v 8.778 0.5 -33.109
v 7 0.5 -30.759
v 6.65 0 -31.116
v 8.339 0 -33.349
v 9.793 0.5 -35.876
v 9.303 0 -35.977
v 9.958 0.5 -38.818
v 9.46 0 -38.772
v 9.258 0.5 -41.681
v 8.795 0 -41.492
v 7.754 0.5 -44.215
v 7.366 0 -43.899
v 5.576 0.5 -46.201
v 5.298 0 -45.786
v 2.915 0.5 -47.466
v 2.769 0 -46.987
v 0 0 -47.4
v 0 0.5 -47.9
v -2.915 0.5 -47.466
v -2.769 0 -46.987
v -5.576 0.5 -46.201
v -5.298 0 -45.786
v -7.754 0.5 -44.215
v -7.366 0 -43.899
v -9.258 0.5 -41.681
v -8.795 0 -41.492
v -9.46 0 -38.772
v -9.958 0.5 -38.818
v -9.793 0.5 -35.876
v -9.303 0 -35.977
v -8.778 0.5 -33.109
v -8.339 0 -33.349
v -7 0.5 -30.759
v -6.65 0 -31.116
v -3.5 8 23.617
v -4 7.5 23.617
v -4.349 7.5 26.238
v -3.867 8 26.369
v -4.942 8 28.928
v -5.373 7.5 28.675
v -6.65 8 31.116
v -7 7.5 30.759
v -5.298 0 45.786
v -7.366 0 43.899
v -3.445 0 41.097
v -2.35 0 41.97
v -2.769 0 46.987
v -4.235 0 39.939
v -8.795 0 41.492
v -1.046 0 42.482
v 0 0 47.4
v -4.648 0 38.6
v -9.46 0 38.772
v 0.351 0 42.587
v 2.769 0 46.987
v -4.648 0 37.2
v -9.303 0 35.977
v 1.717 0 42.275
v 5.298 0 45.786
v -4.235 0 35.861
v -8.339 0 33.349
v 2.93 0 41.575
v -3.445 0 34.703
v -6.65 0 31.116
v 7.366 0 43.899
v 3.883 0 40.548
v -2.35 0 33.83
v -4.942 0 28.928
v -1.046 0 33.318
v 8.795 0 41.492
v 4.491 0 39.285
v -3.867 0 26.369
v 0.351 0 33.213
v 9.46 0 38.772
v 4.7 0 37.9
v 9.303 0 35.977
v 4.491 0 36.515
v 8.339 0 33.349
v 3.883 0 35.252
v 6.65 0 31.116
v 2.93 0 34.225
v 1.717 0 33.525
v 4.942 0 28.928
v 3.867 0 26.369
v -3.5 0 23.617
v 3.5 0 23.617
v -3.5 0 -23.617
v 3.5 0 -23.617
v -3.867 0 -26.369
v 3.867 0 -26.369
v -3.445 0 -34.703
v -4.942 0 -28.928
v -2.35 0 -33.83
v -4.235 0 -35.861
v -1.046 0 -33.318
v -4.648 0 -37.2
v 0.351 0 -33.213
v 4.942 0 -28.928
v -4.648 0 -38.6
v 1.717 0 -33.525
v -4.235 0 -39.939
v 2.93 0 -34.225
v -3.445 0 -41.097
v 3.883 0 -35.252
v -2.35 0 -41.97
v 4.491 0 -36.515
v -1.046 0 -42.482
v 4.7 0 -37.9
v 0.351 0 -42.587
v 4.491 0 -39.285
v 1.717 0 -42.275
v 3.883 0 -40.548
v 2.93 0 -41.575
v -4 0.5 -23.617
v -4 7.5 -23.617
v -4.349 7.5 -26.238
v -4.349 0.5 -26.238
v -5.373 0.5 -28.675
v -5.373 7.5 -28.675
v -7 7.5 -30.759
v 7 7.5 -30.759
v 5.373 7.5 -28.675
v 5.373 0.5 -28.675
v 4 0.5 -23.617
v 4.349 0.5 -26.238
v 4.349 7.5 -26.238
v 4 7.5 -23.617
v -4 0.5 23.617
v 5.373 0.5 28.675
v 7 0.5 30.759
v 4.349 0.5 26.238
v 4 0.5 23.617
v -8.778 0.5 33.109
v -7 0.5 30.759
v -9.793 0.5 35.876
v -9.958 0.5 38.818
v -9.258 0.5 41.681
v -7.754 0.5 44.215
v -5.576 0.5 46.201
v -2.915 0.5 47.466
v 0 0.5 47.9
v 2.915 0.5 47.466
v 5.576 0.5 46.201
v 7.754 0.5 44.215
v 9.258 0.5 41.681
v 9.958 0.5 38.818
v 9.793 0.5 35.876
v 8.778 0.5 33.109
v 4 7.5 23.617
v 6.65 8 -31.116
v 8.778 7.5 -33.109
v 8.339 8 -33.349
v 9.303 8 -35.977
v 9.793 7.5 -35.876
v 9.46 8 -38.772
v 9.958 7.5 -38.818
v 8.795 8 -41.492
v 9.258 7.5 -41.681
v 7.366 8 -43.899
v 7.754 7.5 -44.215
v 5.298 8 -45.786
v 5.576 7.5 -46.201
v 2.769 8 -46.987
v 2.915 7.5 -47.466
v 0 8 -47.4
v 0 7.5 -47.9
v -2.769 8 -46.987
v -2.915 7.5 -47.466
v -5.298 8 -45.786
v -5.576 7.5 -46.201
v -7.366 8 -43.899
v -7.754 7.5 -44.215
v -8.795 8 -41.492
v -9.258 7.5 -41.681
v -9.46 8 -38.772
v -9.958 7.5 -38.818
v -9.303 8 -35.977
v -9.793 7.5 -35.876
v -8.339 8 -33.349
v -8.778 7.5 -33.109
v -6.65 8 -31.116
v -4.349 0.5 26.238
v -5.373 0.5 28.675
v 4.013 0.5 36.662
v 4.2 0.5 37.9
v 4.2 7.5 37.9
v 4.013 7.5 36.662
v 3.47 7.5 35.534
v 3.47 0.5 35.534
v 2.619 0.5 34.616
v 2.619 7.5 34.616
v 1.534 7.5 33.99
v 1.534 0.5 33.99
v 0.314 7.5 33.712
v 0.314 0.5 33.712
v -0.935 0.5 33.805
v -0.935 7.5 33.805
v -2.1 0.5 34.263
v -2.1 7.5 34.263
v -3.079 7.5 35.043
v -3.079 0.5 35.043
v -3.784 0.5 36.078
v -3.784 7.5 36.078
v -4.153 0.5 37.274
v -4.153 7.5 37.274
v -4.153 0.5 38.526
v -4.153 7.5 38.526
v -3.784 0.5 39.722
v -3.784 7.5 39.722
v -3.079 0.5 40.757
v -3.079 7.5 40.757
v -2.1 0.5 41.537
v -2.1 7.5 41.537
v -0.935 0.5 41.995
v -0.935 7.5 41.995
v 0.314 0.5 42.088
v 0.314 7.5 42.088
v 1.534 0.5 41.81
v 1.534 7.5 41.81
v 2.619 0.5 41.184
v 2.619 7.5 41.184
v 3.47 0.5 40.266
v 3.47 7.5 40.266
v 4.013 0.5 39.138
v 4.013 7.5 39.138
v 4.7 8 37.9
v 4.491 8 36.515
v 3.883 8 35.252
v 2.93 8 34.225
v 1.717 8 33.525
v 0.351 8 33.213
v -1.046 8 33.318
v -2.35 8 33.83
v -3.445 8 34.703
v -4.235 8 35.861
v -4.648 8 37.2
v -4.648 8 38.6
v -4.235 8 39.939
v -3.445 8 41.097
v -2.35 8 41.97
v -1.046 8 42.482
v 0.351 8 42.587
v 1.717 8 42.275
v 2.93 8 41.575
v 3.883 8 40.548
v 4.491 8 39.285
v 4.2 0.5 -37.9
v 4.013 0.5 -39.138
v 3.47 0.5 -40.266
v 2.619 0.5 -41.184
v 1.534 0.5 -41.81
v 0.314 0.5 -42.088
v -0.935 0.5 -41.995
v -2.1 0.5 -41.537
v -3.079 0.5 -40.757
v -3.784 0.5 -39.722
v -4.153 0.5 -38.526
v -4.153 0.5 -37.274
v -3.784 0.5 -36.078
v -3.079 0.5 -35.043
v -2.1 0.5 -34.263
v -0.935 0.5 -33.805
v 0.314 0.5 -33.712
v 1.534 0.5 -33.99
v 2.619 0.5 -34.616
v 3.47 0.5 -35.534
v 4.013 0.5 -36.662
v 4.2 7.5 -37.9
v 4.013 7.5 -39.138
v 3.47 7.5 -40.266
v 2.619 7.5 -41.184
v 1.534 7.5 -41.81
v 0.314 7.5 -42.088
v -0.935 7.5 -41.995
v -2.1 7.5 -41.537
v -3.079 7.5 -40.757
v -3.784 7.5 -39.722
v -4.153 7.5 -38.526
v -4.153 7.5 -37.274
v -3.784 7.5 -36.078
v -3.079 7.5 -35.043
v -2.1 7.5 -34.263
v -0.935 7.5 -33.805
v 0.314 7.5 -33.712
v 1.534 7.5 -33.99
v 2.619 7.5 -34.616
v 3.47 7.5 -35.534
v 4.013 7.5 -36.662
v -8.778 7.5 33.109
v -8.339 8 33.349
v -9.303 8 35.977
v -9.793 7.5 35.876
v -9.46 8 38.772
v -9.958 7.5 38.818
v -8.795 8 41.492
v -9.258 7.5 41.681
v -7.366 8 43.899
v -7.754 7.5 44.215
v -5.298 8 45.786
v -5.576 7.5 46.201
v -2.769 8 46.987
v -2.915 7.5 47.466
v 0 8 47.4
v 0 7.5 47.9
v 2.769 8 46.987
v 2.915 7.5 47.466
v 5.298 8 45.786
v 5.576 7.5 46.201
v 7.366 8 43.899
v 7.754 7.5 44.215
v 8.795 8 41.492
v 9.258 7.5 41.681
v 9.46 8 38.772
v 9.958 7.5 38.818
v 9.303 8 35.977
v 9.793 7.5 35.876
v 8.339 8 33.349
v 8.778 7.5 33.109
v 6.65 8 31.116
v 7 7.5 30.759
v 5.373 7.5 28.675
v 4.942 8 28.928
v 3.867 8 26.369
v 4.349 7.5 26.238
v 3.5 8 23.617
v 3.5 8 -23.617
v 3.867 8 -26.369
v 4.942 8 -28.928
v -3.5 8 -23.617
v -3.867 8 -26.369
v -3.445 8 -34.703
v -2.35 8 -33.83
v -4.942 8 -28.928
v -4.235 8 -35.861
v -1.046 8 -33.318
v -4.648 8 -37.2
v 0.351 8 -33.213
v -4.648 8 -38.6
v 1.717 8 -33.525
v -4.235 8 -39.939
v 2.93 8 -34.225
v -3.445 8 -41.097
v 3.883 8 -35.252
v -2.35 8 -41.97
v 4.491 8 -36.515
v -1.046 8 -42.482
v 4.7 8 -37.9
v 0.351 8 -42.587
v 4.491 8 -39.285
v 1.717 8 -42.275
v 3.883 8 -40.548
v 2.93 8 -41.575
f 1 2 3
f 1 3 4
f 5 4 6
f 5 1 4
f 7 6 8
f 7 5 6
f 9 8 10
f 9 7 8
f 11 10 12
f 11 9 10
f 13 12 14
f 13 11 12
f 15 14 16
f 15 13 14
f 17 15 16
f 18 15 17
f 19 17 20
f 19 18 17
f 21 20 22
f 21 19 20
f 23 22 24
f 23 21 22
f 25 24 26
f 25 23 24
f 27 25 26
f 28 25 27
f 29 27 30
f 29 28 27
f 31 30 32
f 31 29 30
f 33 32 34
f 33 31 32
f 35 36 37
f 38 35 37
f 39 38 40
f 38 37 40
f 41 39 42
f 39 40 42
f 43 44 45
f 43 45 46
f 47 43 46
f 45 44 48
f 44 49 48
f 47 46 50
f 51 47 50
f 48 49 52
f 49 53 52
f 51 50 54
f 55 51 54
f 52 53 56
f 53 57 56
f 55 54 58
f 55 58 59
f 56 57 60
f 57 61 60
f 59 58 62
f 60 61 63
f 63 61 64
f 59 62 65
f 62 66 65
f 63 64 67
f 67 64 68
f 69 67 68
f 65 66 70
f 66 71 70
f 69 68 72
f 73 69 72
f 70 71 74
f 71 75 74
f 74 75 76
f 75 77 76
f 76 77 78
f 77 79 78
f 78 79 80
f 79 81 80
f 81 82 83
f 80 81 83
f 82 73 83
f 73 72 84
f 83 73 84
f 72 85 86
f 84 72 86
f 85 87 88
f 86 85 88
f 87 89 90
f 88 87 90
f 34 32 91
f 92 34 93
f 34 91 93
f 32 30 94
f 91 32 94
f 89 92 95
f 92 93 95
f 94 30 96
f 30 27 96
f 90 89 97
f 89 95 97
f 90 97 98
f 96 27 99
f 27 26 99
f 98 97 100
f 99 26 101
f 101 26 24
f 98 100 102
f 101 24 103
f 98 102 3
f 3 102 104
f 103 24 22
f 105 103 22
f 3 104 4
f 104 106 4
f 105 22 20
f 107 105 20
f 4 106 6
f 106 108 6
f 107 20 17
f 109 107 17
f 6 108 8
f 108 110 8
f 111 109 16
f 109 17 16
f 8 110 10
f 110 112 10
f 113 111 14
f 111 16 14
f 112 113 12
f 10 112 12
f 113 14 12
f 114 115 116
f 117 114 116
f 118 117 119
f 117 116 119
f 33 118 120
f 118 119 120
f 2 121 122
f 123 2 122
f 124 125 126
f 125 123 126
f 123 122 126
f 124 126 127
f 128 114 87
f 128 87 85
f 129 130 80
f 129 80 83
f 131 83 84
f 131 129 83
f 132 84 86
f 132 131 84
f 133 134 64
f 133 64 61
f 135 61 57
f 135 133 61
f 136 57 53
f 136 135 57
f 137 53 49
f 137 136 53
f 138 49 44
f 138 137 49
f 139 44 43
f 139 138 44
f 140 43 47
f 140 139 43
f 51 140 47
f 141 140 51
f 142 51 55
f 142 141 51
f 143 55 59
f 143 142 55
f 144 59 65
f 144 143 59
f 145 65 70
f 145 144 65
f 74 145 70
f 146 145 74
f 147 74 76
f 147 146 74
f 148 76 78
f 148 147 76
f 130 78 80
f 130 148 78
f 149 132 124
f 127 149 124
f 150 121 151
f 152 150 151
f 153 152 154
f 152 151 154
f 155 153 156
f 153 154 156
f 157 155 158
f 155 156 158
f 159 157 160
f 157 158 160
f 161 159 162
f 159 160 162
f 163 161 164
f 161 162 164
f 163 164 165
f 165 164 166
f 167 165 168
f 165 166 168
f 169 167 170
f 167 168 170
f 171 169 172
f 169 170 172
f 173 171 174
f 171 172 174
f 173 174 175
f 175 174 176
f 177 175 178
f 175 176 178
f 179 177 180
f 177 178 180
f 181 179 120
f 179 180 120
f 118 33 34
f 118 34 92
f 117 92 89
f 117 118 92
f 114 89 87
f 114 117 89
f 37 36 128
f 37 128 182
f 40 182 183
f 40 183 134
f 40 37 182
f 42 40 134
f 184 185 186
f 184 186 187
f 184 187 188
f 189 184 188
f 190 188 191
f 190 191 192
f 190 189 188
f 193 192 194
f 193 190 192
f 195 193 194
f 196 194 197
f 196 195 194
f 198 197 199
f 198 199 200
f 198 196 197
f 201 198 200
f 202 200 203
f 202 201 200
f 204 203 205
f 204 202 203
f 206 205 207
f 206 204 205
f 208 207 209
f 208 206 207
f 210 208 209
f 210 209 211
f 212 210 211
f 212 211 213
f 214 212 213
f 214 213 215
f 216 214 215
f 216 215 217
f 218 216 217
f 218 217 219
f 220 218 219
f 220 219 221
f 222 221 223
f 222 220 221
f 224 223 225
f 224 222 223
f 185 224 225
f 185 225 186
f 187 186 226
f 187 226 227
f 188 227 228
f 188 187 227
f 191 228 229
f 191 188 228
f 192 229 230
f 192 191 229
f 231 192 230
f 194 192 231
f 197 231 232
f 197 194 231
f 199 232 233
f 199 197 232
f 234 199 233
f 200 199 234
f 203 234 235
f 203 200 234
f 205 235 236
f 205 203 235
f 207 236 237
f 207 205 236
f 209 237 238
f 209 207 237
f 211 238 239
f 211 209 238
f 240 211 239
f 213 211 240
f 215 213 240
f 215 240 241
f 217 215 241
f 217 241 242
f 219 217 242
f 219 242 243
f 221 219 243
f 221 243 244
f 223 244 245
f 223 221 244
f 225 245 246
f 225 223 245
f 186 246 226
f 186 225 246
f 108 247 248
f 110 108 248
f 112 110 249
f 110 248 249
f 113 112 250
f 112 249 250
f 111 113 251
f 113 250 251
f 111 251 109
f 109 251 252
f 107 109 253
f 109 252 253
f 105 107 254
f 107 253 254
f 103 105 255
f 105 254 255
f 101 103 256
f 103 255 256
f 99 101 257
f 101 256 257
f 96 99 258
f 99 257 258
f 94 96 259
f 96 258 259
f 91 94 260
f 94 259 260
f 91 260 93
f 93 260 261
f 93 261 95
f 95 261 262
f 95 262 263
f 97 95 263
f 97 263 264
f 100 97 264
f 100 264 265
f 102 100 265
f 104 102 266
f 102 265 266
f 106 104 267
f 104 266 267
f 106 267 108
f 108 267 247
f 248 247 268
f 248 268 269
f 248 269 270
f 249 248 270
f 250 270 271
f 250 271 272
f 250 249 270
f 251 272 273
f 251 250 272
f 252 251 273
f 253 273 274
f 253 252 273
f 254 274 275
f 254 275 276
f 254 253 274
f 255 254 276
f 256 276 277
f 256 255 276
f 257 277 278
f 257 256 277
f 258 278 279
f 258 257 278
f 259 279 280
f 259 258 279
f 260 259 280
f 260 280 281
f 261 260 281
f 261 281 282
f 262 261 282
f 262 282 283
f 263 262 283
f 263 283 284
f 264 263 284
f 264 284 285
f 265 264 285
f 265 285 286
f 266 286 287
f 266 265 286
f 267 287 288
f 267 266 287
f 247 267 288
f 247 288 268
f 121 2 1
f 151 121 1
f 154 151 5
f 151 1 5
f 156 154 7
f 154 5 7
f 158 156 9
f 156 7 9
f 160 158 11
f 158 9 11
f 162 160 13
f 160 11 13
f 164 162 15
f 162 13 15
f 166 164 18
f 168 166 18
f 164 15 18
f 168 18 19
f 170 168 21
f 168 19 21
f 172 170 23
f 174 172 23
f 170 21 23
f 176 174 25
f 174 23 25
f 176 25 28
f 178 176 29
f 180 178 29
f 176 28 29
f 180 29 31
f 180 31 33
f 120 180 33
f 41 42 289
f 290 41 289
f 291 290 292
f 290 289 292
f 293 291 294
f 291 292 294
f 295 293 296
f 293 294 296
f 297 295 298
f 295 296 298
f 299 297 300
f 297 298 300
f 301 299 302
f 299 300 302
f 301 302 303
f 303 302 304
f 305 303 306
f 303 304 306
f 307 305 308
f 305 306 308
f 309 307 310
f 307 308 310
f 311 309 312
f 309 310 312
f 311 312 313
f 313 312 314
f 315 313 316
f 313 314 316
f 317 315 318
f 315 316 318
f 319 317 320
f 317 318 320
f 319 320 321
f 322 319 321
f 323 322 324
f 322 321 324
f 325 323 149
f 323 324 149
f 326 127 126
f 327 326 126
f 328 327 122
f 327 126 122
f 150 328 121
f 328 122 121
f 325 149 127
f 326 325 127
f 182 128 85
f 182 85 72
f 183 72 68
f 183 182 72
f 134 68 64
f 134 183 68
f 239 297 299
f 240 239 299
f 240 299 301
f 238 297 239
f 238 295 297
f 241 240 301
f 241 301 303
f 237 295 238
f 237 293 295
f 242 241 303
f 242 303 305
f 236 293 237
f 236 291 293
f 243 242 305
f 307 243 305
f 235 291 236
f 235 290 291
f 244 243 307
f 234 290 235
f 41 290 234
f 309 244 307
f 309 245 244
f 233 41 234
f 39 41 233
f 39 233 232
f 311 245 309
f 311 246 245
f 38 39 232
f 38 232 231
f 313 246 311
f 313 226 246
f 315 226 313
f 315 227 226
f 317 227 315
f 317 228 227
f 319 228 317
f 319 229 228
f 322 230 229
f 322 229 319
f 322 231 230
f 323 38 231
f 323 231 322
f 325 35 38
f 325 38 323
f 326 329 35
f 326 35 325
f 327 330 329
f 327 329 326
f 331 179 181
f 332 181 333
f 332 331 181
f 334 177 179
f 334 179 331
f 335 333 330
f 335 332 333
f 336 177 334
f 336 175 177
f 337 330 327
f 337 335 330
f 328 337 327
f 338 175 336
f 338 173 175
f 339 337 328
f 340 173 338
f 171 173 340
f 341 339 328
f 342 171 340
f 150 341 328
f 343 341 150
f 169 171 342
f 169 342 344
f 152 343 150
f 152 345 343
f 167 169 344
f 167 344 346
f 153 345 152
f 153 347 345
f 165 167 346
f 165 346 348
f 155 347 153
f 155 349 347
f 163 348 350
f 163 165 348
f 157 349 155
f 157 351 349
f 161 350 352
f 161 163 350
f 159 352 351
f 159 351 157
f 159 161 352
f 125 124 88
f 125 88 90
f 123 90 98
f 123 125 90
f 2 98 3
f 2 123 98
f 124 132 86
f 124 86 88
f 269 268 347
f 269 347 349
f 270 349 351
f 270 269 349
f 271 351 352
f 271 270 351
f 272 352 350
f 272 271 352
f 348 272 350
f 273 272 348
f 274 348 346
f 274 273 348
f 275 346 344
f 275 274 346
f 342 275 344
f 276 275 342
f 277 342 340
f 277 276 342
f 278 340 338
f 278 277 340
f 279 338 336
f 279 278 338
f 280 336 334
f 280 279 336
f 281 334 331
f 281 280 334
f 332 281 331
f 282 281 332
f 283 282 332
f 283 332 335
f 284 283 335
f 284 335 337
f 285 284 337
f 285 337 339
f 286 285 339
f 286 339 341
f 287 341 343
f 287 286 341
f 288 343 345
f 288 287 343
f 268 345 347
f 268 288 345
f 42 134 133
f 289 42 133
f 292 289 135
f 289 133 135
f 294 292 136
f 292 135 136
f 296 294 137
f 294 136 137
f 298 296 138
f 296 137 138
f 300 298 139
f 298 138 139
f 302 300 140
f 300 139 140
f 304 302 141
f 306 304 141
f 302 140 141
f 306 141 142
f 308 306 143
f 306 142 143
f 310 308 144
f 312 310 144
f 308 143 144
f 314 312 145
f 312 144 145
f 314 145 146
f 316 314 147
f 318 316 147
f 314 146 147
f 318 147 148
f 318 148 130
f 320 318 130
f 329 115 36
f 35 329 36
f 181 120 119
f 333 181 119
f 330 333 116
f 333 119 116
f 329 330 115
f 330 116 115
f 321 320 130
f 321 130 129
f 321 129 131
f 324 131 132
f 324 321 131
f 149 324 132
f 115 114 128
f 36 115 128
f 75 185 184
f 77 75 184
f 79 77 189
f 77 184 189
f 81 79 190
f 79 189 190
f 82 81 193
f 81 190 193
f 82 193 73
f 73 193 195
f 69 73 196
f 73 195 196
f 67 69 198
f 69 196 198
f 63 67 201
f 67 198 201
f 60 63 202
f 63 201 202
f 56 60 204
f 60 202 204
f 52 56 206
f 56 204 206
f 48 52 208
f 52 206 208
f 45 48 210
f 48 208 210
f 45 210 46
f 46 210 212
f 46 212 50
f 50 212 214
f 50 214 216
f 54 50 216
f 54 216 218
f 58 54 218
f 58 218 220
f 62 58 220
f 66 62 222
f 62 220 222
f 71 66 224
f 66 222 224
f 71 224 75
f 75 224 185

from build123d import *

# Parameters (mm, degrees)
SKETCH1_R           = 4.2
BOSS_EXTRUDE1_DEPTH = 8
FILLET1_R           = 10
CHAMFER1_SIZE       = 0.5


with BuildPart() as part:
    # Sketch1 → Boss-Extrude1 (new body)
    with BuildSketch(Plane(origin=(0, 0, 0), x_dir=(1, 0, 0), z_dir=(0, 1, 0))):
        with BuildLine():
            Line((-4, 28.73484861), (-4, -28.73484861))
            ThreePointArc((-4, -28.73484861), (0, -47.9), (4, -28.73484861))
            Line((4, -28.73484861), (4, 28.73484861))
            ThreePointArc((4, 28.73484861), (0, 47.9), (-4, 28.73484861))
        make_face()
        with Locations((0, 37.9)):
            Circle(SKETCH1_R, mode=Mode.SUBTRACT)
        with Locations((0, -37.9)):
            Circle(SKETCH1_R, mode=Mode.SUBTRACT)
    extrude(amount=BOSS_EXTRUDE1_DEPTH)

    # Fillet1
    fillet1_edges = [part.edges().sort_by_distance(p)[0] for p in [
        (4, 4, -28.73484861),
        (4, 4, 28.73484861),
        (-4, 4, 28.73484861),
        (-4, 4, -28.73484861),
    ]]
    fillet(fillet1_edges, radius=FILLET1_R)

    # Chamfer1
    chamfer1_edges = [part.edges().sort_by_distance(p)[0] for p in [
        (-4.2, 0, -37.9),
        (-4.2, 8, -37.9),
        (-4.2, 0, 37.9),
        (-4.2, 8, 37.9),
        (4, 0, 0),
        (4, 8, 0),
        (0, 0, 47.9),
        (0, 8, 47.9),
        (0, 0, -47.9),
        (0, 8, -47.9),
        (-4, 0, 0),
        (-4, 8, 0),
        (4.780455543, 0, 27.490126489),
        (4.780455543, 8, 27.490126489),
        (4.780455543, 0, -27.490126489),
        (4.780455543, 8, -27.490126489),
        (-4.780455543, 0, -27.490126489),
        (-4.780455543, 8, -27.490126489),
        (-4.780455543, 0, 27.490126489),
        (-4.780455543, 8, 27.490126489),
    ]]
    chamfer(chamfer1_edges, length=CHAMFER1_SIZE)


solid = part.part
